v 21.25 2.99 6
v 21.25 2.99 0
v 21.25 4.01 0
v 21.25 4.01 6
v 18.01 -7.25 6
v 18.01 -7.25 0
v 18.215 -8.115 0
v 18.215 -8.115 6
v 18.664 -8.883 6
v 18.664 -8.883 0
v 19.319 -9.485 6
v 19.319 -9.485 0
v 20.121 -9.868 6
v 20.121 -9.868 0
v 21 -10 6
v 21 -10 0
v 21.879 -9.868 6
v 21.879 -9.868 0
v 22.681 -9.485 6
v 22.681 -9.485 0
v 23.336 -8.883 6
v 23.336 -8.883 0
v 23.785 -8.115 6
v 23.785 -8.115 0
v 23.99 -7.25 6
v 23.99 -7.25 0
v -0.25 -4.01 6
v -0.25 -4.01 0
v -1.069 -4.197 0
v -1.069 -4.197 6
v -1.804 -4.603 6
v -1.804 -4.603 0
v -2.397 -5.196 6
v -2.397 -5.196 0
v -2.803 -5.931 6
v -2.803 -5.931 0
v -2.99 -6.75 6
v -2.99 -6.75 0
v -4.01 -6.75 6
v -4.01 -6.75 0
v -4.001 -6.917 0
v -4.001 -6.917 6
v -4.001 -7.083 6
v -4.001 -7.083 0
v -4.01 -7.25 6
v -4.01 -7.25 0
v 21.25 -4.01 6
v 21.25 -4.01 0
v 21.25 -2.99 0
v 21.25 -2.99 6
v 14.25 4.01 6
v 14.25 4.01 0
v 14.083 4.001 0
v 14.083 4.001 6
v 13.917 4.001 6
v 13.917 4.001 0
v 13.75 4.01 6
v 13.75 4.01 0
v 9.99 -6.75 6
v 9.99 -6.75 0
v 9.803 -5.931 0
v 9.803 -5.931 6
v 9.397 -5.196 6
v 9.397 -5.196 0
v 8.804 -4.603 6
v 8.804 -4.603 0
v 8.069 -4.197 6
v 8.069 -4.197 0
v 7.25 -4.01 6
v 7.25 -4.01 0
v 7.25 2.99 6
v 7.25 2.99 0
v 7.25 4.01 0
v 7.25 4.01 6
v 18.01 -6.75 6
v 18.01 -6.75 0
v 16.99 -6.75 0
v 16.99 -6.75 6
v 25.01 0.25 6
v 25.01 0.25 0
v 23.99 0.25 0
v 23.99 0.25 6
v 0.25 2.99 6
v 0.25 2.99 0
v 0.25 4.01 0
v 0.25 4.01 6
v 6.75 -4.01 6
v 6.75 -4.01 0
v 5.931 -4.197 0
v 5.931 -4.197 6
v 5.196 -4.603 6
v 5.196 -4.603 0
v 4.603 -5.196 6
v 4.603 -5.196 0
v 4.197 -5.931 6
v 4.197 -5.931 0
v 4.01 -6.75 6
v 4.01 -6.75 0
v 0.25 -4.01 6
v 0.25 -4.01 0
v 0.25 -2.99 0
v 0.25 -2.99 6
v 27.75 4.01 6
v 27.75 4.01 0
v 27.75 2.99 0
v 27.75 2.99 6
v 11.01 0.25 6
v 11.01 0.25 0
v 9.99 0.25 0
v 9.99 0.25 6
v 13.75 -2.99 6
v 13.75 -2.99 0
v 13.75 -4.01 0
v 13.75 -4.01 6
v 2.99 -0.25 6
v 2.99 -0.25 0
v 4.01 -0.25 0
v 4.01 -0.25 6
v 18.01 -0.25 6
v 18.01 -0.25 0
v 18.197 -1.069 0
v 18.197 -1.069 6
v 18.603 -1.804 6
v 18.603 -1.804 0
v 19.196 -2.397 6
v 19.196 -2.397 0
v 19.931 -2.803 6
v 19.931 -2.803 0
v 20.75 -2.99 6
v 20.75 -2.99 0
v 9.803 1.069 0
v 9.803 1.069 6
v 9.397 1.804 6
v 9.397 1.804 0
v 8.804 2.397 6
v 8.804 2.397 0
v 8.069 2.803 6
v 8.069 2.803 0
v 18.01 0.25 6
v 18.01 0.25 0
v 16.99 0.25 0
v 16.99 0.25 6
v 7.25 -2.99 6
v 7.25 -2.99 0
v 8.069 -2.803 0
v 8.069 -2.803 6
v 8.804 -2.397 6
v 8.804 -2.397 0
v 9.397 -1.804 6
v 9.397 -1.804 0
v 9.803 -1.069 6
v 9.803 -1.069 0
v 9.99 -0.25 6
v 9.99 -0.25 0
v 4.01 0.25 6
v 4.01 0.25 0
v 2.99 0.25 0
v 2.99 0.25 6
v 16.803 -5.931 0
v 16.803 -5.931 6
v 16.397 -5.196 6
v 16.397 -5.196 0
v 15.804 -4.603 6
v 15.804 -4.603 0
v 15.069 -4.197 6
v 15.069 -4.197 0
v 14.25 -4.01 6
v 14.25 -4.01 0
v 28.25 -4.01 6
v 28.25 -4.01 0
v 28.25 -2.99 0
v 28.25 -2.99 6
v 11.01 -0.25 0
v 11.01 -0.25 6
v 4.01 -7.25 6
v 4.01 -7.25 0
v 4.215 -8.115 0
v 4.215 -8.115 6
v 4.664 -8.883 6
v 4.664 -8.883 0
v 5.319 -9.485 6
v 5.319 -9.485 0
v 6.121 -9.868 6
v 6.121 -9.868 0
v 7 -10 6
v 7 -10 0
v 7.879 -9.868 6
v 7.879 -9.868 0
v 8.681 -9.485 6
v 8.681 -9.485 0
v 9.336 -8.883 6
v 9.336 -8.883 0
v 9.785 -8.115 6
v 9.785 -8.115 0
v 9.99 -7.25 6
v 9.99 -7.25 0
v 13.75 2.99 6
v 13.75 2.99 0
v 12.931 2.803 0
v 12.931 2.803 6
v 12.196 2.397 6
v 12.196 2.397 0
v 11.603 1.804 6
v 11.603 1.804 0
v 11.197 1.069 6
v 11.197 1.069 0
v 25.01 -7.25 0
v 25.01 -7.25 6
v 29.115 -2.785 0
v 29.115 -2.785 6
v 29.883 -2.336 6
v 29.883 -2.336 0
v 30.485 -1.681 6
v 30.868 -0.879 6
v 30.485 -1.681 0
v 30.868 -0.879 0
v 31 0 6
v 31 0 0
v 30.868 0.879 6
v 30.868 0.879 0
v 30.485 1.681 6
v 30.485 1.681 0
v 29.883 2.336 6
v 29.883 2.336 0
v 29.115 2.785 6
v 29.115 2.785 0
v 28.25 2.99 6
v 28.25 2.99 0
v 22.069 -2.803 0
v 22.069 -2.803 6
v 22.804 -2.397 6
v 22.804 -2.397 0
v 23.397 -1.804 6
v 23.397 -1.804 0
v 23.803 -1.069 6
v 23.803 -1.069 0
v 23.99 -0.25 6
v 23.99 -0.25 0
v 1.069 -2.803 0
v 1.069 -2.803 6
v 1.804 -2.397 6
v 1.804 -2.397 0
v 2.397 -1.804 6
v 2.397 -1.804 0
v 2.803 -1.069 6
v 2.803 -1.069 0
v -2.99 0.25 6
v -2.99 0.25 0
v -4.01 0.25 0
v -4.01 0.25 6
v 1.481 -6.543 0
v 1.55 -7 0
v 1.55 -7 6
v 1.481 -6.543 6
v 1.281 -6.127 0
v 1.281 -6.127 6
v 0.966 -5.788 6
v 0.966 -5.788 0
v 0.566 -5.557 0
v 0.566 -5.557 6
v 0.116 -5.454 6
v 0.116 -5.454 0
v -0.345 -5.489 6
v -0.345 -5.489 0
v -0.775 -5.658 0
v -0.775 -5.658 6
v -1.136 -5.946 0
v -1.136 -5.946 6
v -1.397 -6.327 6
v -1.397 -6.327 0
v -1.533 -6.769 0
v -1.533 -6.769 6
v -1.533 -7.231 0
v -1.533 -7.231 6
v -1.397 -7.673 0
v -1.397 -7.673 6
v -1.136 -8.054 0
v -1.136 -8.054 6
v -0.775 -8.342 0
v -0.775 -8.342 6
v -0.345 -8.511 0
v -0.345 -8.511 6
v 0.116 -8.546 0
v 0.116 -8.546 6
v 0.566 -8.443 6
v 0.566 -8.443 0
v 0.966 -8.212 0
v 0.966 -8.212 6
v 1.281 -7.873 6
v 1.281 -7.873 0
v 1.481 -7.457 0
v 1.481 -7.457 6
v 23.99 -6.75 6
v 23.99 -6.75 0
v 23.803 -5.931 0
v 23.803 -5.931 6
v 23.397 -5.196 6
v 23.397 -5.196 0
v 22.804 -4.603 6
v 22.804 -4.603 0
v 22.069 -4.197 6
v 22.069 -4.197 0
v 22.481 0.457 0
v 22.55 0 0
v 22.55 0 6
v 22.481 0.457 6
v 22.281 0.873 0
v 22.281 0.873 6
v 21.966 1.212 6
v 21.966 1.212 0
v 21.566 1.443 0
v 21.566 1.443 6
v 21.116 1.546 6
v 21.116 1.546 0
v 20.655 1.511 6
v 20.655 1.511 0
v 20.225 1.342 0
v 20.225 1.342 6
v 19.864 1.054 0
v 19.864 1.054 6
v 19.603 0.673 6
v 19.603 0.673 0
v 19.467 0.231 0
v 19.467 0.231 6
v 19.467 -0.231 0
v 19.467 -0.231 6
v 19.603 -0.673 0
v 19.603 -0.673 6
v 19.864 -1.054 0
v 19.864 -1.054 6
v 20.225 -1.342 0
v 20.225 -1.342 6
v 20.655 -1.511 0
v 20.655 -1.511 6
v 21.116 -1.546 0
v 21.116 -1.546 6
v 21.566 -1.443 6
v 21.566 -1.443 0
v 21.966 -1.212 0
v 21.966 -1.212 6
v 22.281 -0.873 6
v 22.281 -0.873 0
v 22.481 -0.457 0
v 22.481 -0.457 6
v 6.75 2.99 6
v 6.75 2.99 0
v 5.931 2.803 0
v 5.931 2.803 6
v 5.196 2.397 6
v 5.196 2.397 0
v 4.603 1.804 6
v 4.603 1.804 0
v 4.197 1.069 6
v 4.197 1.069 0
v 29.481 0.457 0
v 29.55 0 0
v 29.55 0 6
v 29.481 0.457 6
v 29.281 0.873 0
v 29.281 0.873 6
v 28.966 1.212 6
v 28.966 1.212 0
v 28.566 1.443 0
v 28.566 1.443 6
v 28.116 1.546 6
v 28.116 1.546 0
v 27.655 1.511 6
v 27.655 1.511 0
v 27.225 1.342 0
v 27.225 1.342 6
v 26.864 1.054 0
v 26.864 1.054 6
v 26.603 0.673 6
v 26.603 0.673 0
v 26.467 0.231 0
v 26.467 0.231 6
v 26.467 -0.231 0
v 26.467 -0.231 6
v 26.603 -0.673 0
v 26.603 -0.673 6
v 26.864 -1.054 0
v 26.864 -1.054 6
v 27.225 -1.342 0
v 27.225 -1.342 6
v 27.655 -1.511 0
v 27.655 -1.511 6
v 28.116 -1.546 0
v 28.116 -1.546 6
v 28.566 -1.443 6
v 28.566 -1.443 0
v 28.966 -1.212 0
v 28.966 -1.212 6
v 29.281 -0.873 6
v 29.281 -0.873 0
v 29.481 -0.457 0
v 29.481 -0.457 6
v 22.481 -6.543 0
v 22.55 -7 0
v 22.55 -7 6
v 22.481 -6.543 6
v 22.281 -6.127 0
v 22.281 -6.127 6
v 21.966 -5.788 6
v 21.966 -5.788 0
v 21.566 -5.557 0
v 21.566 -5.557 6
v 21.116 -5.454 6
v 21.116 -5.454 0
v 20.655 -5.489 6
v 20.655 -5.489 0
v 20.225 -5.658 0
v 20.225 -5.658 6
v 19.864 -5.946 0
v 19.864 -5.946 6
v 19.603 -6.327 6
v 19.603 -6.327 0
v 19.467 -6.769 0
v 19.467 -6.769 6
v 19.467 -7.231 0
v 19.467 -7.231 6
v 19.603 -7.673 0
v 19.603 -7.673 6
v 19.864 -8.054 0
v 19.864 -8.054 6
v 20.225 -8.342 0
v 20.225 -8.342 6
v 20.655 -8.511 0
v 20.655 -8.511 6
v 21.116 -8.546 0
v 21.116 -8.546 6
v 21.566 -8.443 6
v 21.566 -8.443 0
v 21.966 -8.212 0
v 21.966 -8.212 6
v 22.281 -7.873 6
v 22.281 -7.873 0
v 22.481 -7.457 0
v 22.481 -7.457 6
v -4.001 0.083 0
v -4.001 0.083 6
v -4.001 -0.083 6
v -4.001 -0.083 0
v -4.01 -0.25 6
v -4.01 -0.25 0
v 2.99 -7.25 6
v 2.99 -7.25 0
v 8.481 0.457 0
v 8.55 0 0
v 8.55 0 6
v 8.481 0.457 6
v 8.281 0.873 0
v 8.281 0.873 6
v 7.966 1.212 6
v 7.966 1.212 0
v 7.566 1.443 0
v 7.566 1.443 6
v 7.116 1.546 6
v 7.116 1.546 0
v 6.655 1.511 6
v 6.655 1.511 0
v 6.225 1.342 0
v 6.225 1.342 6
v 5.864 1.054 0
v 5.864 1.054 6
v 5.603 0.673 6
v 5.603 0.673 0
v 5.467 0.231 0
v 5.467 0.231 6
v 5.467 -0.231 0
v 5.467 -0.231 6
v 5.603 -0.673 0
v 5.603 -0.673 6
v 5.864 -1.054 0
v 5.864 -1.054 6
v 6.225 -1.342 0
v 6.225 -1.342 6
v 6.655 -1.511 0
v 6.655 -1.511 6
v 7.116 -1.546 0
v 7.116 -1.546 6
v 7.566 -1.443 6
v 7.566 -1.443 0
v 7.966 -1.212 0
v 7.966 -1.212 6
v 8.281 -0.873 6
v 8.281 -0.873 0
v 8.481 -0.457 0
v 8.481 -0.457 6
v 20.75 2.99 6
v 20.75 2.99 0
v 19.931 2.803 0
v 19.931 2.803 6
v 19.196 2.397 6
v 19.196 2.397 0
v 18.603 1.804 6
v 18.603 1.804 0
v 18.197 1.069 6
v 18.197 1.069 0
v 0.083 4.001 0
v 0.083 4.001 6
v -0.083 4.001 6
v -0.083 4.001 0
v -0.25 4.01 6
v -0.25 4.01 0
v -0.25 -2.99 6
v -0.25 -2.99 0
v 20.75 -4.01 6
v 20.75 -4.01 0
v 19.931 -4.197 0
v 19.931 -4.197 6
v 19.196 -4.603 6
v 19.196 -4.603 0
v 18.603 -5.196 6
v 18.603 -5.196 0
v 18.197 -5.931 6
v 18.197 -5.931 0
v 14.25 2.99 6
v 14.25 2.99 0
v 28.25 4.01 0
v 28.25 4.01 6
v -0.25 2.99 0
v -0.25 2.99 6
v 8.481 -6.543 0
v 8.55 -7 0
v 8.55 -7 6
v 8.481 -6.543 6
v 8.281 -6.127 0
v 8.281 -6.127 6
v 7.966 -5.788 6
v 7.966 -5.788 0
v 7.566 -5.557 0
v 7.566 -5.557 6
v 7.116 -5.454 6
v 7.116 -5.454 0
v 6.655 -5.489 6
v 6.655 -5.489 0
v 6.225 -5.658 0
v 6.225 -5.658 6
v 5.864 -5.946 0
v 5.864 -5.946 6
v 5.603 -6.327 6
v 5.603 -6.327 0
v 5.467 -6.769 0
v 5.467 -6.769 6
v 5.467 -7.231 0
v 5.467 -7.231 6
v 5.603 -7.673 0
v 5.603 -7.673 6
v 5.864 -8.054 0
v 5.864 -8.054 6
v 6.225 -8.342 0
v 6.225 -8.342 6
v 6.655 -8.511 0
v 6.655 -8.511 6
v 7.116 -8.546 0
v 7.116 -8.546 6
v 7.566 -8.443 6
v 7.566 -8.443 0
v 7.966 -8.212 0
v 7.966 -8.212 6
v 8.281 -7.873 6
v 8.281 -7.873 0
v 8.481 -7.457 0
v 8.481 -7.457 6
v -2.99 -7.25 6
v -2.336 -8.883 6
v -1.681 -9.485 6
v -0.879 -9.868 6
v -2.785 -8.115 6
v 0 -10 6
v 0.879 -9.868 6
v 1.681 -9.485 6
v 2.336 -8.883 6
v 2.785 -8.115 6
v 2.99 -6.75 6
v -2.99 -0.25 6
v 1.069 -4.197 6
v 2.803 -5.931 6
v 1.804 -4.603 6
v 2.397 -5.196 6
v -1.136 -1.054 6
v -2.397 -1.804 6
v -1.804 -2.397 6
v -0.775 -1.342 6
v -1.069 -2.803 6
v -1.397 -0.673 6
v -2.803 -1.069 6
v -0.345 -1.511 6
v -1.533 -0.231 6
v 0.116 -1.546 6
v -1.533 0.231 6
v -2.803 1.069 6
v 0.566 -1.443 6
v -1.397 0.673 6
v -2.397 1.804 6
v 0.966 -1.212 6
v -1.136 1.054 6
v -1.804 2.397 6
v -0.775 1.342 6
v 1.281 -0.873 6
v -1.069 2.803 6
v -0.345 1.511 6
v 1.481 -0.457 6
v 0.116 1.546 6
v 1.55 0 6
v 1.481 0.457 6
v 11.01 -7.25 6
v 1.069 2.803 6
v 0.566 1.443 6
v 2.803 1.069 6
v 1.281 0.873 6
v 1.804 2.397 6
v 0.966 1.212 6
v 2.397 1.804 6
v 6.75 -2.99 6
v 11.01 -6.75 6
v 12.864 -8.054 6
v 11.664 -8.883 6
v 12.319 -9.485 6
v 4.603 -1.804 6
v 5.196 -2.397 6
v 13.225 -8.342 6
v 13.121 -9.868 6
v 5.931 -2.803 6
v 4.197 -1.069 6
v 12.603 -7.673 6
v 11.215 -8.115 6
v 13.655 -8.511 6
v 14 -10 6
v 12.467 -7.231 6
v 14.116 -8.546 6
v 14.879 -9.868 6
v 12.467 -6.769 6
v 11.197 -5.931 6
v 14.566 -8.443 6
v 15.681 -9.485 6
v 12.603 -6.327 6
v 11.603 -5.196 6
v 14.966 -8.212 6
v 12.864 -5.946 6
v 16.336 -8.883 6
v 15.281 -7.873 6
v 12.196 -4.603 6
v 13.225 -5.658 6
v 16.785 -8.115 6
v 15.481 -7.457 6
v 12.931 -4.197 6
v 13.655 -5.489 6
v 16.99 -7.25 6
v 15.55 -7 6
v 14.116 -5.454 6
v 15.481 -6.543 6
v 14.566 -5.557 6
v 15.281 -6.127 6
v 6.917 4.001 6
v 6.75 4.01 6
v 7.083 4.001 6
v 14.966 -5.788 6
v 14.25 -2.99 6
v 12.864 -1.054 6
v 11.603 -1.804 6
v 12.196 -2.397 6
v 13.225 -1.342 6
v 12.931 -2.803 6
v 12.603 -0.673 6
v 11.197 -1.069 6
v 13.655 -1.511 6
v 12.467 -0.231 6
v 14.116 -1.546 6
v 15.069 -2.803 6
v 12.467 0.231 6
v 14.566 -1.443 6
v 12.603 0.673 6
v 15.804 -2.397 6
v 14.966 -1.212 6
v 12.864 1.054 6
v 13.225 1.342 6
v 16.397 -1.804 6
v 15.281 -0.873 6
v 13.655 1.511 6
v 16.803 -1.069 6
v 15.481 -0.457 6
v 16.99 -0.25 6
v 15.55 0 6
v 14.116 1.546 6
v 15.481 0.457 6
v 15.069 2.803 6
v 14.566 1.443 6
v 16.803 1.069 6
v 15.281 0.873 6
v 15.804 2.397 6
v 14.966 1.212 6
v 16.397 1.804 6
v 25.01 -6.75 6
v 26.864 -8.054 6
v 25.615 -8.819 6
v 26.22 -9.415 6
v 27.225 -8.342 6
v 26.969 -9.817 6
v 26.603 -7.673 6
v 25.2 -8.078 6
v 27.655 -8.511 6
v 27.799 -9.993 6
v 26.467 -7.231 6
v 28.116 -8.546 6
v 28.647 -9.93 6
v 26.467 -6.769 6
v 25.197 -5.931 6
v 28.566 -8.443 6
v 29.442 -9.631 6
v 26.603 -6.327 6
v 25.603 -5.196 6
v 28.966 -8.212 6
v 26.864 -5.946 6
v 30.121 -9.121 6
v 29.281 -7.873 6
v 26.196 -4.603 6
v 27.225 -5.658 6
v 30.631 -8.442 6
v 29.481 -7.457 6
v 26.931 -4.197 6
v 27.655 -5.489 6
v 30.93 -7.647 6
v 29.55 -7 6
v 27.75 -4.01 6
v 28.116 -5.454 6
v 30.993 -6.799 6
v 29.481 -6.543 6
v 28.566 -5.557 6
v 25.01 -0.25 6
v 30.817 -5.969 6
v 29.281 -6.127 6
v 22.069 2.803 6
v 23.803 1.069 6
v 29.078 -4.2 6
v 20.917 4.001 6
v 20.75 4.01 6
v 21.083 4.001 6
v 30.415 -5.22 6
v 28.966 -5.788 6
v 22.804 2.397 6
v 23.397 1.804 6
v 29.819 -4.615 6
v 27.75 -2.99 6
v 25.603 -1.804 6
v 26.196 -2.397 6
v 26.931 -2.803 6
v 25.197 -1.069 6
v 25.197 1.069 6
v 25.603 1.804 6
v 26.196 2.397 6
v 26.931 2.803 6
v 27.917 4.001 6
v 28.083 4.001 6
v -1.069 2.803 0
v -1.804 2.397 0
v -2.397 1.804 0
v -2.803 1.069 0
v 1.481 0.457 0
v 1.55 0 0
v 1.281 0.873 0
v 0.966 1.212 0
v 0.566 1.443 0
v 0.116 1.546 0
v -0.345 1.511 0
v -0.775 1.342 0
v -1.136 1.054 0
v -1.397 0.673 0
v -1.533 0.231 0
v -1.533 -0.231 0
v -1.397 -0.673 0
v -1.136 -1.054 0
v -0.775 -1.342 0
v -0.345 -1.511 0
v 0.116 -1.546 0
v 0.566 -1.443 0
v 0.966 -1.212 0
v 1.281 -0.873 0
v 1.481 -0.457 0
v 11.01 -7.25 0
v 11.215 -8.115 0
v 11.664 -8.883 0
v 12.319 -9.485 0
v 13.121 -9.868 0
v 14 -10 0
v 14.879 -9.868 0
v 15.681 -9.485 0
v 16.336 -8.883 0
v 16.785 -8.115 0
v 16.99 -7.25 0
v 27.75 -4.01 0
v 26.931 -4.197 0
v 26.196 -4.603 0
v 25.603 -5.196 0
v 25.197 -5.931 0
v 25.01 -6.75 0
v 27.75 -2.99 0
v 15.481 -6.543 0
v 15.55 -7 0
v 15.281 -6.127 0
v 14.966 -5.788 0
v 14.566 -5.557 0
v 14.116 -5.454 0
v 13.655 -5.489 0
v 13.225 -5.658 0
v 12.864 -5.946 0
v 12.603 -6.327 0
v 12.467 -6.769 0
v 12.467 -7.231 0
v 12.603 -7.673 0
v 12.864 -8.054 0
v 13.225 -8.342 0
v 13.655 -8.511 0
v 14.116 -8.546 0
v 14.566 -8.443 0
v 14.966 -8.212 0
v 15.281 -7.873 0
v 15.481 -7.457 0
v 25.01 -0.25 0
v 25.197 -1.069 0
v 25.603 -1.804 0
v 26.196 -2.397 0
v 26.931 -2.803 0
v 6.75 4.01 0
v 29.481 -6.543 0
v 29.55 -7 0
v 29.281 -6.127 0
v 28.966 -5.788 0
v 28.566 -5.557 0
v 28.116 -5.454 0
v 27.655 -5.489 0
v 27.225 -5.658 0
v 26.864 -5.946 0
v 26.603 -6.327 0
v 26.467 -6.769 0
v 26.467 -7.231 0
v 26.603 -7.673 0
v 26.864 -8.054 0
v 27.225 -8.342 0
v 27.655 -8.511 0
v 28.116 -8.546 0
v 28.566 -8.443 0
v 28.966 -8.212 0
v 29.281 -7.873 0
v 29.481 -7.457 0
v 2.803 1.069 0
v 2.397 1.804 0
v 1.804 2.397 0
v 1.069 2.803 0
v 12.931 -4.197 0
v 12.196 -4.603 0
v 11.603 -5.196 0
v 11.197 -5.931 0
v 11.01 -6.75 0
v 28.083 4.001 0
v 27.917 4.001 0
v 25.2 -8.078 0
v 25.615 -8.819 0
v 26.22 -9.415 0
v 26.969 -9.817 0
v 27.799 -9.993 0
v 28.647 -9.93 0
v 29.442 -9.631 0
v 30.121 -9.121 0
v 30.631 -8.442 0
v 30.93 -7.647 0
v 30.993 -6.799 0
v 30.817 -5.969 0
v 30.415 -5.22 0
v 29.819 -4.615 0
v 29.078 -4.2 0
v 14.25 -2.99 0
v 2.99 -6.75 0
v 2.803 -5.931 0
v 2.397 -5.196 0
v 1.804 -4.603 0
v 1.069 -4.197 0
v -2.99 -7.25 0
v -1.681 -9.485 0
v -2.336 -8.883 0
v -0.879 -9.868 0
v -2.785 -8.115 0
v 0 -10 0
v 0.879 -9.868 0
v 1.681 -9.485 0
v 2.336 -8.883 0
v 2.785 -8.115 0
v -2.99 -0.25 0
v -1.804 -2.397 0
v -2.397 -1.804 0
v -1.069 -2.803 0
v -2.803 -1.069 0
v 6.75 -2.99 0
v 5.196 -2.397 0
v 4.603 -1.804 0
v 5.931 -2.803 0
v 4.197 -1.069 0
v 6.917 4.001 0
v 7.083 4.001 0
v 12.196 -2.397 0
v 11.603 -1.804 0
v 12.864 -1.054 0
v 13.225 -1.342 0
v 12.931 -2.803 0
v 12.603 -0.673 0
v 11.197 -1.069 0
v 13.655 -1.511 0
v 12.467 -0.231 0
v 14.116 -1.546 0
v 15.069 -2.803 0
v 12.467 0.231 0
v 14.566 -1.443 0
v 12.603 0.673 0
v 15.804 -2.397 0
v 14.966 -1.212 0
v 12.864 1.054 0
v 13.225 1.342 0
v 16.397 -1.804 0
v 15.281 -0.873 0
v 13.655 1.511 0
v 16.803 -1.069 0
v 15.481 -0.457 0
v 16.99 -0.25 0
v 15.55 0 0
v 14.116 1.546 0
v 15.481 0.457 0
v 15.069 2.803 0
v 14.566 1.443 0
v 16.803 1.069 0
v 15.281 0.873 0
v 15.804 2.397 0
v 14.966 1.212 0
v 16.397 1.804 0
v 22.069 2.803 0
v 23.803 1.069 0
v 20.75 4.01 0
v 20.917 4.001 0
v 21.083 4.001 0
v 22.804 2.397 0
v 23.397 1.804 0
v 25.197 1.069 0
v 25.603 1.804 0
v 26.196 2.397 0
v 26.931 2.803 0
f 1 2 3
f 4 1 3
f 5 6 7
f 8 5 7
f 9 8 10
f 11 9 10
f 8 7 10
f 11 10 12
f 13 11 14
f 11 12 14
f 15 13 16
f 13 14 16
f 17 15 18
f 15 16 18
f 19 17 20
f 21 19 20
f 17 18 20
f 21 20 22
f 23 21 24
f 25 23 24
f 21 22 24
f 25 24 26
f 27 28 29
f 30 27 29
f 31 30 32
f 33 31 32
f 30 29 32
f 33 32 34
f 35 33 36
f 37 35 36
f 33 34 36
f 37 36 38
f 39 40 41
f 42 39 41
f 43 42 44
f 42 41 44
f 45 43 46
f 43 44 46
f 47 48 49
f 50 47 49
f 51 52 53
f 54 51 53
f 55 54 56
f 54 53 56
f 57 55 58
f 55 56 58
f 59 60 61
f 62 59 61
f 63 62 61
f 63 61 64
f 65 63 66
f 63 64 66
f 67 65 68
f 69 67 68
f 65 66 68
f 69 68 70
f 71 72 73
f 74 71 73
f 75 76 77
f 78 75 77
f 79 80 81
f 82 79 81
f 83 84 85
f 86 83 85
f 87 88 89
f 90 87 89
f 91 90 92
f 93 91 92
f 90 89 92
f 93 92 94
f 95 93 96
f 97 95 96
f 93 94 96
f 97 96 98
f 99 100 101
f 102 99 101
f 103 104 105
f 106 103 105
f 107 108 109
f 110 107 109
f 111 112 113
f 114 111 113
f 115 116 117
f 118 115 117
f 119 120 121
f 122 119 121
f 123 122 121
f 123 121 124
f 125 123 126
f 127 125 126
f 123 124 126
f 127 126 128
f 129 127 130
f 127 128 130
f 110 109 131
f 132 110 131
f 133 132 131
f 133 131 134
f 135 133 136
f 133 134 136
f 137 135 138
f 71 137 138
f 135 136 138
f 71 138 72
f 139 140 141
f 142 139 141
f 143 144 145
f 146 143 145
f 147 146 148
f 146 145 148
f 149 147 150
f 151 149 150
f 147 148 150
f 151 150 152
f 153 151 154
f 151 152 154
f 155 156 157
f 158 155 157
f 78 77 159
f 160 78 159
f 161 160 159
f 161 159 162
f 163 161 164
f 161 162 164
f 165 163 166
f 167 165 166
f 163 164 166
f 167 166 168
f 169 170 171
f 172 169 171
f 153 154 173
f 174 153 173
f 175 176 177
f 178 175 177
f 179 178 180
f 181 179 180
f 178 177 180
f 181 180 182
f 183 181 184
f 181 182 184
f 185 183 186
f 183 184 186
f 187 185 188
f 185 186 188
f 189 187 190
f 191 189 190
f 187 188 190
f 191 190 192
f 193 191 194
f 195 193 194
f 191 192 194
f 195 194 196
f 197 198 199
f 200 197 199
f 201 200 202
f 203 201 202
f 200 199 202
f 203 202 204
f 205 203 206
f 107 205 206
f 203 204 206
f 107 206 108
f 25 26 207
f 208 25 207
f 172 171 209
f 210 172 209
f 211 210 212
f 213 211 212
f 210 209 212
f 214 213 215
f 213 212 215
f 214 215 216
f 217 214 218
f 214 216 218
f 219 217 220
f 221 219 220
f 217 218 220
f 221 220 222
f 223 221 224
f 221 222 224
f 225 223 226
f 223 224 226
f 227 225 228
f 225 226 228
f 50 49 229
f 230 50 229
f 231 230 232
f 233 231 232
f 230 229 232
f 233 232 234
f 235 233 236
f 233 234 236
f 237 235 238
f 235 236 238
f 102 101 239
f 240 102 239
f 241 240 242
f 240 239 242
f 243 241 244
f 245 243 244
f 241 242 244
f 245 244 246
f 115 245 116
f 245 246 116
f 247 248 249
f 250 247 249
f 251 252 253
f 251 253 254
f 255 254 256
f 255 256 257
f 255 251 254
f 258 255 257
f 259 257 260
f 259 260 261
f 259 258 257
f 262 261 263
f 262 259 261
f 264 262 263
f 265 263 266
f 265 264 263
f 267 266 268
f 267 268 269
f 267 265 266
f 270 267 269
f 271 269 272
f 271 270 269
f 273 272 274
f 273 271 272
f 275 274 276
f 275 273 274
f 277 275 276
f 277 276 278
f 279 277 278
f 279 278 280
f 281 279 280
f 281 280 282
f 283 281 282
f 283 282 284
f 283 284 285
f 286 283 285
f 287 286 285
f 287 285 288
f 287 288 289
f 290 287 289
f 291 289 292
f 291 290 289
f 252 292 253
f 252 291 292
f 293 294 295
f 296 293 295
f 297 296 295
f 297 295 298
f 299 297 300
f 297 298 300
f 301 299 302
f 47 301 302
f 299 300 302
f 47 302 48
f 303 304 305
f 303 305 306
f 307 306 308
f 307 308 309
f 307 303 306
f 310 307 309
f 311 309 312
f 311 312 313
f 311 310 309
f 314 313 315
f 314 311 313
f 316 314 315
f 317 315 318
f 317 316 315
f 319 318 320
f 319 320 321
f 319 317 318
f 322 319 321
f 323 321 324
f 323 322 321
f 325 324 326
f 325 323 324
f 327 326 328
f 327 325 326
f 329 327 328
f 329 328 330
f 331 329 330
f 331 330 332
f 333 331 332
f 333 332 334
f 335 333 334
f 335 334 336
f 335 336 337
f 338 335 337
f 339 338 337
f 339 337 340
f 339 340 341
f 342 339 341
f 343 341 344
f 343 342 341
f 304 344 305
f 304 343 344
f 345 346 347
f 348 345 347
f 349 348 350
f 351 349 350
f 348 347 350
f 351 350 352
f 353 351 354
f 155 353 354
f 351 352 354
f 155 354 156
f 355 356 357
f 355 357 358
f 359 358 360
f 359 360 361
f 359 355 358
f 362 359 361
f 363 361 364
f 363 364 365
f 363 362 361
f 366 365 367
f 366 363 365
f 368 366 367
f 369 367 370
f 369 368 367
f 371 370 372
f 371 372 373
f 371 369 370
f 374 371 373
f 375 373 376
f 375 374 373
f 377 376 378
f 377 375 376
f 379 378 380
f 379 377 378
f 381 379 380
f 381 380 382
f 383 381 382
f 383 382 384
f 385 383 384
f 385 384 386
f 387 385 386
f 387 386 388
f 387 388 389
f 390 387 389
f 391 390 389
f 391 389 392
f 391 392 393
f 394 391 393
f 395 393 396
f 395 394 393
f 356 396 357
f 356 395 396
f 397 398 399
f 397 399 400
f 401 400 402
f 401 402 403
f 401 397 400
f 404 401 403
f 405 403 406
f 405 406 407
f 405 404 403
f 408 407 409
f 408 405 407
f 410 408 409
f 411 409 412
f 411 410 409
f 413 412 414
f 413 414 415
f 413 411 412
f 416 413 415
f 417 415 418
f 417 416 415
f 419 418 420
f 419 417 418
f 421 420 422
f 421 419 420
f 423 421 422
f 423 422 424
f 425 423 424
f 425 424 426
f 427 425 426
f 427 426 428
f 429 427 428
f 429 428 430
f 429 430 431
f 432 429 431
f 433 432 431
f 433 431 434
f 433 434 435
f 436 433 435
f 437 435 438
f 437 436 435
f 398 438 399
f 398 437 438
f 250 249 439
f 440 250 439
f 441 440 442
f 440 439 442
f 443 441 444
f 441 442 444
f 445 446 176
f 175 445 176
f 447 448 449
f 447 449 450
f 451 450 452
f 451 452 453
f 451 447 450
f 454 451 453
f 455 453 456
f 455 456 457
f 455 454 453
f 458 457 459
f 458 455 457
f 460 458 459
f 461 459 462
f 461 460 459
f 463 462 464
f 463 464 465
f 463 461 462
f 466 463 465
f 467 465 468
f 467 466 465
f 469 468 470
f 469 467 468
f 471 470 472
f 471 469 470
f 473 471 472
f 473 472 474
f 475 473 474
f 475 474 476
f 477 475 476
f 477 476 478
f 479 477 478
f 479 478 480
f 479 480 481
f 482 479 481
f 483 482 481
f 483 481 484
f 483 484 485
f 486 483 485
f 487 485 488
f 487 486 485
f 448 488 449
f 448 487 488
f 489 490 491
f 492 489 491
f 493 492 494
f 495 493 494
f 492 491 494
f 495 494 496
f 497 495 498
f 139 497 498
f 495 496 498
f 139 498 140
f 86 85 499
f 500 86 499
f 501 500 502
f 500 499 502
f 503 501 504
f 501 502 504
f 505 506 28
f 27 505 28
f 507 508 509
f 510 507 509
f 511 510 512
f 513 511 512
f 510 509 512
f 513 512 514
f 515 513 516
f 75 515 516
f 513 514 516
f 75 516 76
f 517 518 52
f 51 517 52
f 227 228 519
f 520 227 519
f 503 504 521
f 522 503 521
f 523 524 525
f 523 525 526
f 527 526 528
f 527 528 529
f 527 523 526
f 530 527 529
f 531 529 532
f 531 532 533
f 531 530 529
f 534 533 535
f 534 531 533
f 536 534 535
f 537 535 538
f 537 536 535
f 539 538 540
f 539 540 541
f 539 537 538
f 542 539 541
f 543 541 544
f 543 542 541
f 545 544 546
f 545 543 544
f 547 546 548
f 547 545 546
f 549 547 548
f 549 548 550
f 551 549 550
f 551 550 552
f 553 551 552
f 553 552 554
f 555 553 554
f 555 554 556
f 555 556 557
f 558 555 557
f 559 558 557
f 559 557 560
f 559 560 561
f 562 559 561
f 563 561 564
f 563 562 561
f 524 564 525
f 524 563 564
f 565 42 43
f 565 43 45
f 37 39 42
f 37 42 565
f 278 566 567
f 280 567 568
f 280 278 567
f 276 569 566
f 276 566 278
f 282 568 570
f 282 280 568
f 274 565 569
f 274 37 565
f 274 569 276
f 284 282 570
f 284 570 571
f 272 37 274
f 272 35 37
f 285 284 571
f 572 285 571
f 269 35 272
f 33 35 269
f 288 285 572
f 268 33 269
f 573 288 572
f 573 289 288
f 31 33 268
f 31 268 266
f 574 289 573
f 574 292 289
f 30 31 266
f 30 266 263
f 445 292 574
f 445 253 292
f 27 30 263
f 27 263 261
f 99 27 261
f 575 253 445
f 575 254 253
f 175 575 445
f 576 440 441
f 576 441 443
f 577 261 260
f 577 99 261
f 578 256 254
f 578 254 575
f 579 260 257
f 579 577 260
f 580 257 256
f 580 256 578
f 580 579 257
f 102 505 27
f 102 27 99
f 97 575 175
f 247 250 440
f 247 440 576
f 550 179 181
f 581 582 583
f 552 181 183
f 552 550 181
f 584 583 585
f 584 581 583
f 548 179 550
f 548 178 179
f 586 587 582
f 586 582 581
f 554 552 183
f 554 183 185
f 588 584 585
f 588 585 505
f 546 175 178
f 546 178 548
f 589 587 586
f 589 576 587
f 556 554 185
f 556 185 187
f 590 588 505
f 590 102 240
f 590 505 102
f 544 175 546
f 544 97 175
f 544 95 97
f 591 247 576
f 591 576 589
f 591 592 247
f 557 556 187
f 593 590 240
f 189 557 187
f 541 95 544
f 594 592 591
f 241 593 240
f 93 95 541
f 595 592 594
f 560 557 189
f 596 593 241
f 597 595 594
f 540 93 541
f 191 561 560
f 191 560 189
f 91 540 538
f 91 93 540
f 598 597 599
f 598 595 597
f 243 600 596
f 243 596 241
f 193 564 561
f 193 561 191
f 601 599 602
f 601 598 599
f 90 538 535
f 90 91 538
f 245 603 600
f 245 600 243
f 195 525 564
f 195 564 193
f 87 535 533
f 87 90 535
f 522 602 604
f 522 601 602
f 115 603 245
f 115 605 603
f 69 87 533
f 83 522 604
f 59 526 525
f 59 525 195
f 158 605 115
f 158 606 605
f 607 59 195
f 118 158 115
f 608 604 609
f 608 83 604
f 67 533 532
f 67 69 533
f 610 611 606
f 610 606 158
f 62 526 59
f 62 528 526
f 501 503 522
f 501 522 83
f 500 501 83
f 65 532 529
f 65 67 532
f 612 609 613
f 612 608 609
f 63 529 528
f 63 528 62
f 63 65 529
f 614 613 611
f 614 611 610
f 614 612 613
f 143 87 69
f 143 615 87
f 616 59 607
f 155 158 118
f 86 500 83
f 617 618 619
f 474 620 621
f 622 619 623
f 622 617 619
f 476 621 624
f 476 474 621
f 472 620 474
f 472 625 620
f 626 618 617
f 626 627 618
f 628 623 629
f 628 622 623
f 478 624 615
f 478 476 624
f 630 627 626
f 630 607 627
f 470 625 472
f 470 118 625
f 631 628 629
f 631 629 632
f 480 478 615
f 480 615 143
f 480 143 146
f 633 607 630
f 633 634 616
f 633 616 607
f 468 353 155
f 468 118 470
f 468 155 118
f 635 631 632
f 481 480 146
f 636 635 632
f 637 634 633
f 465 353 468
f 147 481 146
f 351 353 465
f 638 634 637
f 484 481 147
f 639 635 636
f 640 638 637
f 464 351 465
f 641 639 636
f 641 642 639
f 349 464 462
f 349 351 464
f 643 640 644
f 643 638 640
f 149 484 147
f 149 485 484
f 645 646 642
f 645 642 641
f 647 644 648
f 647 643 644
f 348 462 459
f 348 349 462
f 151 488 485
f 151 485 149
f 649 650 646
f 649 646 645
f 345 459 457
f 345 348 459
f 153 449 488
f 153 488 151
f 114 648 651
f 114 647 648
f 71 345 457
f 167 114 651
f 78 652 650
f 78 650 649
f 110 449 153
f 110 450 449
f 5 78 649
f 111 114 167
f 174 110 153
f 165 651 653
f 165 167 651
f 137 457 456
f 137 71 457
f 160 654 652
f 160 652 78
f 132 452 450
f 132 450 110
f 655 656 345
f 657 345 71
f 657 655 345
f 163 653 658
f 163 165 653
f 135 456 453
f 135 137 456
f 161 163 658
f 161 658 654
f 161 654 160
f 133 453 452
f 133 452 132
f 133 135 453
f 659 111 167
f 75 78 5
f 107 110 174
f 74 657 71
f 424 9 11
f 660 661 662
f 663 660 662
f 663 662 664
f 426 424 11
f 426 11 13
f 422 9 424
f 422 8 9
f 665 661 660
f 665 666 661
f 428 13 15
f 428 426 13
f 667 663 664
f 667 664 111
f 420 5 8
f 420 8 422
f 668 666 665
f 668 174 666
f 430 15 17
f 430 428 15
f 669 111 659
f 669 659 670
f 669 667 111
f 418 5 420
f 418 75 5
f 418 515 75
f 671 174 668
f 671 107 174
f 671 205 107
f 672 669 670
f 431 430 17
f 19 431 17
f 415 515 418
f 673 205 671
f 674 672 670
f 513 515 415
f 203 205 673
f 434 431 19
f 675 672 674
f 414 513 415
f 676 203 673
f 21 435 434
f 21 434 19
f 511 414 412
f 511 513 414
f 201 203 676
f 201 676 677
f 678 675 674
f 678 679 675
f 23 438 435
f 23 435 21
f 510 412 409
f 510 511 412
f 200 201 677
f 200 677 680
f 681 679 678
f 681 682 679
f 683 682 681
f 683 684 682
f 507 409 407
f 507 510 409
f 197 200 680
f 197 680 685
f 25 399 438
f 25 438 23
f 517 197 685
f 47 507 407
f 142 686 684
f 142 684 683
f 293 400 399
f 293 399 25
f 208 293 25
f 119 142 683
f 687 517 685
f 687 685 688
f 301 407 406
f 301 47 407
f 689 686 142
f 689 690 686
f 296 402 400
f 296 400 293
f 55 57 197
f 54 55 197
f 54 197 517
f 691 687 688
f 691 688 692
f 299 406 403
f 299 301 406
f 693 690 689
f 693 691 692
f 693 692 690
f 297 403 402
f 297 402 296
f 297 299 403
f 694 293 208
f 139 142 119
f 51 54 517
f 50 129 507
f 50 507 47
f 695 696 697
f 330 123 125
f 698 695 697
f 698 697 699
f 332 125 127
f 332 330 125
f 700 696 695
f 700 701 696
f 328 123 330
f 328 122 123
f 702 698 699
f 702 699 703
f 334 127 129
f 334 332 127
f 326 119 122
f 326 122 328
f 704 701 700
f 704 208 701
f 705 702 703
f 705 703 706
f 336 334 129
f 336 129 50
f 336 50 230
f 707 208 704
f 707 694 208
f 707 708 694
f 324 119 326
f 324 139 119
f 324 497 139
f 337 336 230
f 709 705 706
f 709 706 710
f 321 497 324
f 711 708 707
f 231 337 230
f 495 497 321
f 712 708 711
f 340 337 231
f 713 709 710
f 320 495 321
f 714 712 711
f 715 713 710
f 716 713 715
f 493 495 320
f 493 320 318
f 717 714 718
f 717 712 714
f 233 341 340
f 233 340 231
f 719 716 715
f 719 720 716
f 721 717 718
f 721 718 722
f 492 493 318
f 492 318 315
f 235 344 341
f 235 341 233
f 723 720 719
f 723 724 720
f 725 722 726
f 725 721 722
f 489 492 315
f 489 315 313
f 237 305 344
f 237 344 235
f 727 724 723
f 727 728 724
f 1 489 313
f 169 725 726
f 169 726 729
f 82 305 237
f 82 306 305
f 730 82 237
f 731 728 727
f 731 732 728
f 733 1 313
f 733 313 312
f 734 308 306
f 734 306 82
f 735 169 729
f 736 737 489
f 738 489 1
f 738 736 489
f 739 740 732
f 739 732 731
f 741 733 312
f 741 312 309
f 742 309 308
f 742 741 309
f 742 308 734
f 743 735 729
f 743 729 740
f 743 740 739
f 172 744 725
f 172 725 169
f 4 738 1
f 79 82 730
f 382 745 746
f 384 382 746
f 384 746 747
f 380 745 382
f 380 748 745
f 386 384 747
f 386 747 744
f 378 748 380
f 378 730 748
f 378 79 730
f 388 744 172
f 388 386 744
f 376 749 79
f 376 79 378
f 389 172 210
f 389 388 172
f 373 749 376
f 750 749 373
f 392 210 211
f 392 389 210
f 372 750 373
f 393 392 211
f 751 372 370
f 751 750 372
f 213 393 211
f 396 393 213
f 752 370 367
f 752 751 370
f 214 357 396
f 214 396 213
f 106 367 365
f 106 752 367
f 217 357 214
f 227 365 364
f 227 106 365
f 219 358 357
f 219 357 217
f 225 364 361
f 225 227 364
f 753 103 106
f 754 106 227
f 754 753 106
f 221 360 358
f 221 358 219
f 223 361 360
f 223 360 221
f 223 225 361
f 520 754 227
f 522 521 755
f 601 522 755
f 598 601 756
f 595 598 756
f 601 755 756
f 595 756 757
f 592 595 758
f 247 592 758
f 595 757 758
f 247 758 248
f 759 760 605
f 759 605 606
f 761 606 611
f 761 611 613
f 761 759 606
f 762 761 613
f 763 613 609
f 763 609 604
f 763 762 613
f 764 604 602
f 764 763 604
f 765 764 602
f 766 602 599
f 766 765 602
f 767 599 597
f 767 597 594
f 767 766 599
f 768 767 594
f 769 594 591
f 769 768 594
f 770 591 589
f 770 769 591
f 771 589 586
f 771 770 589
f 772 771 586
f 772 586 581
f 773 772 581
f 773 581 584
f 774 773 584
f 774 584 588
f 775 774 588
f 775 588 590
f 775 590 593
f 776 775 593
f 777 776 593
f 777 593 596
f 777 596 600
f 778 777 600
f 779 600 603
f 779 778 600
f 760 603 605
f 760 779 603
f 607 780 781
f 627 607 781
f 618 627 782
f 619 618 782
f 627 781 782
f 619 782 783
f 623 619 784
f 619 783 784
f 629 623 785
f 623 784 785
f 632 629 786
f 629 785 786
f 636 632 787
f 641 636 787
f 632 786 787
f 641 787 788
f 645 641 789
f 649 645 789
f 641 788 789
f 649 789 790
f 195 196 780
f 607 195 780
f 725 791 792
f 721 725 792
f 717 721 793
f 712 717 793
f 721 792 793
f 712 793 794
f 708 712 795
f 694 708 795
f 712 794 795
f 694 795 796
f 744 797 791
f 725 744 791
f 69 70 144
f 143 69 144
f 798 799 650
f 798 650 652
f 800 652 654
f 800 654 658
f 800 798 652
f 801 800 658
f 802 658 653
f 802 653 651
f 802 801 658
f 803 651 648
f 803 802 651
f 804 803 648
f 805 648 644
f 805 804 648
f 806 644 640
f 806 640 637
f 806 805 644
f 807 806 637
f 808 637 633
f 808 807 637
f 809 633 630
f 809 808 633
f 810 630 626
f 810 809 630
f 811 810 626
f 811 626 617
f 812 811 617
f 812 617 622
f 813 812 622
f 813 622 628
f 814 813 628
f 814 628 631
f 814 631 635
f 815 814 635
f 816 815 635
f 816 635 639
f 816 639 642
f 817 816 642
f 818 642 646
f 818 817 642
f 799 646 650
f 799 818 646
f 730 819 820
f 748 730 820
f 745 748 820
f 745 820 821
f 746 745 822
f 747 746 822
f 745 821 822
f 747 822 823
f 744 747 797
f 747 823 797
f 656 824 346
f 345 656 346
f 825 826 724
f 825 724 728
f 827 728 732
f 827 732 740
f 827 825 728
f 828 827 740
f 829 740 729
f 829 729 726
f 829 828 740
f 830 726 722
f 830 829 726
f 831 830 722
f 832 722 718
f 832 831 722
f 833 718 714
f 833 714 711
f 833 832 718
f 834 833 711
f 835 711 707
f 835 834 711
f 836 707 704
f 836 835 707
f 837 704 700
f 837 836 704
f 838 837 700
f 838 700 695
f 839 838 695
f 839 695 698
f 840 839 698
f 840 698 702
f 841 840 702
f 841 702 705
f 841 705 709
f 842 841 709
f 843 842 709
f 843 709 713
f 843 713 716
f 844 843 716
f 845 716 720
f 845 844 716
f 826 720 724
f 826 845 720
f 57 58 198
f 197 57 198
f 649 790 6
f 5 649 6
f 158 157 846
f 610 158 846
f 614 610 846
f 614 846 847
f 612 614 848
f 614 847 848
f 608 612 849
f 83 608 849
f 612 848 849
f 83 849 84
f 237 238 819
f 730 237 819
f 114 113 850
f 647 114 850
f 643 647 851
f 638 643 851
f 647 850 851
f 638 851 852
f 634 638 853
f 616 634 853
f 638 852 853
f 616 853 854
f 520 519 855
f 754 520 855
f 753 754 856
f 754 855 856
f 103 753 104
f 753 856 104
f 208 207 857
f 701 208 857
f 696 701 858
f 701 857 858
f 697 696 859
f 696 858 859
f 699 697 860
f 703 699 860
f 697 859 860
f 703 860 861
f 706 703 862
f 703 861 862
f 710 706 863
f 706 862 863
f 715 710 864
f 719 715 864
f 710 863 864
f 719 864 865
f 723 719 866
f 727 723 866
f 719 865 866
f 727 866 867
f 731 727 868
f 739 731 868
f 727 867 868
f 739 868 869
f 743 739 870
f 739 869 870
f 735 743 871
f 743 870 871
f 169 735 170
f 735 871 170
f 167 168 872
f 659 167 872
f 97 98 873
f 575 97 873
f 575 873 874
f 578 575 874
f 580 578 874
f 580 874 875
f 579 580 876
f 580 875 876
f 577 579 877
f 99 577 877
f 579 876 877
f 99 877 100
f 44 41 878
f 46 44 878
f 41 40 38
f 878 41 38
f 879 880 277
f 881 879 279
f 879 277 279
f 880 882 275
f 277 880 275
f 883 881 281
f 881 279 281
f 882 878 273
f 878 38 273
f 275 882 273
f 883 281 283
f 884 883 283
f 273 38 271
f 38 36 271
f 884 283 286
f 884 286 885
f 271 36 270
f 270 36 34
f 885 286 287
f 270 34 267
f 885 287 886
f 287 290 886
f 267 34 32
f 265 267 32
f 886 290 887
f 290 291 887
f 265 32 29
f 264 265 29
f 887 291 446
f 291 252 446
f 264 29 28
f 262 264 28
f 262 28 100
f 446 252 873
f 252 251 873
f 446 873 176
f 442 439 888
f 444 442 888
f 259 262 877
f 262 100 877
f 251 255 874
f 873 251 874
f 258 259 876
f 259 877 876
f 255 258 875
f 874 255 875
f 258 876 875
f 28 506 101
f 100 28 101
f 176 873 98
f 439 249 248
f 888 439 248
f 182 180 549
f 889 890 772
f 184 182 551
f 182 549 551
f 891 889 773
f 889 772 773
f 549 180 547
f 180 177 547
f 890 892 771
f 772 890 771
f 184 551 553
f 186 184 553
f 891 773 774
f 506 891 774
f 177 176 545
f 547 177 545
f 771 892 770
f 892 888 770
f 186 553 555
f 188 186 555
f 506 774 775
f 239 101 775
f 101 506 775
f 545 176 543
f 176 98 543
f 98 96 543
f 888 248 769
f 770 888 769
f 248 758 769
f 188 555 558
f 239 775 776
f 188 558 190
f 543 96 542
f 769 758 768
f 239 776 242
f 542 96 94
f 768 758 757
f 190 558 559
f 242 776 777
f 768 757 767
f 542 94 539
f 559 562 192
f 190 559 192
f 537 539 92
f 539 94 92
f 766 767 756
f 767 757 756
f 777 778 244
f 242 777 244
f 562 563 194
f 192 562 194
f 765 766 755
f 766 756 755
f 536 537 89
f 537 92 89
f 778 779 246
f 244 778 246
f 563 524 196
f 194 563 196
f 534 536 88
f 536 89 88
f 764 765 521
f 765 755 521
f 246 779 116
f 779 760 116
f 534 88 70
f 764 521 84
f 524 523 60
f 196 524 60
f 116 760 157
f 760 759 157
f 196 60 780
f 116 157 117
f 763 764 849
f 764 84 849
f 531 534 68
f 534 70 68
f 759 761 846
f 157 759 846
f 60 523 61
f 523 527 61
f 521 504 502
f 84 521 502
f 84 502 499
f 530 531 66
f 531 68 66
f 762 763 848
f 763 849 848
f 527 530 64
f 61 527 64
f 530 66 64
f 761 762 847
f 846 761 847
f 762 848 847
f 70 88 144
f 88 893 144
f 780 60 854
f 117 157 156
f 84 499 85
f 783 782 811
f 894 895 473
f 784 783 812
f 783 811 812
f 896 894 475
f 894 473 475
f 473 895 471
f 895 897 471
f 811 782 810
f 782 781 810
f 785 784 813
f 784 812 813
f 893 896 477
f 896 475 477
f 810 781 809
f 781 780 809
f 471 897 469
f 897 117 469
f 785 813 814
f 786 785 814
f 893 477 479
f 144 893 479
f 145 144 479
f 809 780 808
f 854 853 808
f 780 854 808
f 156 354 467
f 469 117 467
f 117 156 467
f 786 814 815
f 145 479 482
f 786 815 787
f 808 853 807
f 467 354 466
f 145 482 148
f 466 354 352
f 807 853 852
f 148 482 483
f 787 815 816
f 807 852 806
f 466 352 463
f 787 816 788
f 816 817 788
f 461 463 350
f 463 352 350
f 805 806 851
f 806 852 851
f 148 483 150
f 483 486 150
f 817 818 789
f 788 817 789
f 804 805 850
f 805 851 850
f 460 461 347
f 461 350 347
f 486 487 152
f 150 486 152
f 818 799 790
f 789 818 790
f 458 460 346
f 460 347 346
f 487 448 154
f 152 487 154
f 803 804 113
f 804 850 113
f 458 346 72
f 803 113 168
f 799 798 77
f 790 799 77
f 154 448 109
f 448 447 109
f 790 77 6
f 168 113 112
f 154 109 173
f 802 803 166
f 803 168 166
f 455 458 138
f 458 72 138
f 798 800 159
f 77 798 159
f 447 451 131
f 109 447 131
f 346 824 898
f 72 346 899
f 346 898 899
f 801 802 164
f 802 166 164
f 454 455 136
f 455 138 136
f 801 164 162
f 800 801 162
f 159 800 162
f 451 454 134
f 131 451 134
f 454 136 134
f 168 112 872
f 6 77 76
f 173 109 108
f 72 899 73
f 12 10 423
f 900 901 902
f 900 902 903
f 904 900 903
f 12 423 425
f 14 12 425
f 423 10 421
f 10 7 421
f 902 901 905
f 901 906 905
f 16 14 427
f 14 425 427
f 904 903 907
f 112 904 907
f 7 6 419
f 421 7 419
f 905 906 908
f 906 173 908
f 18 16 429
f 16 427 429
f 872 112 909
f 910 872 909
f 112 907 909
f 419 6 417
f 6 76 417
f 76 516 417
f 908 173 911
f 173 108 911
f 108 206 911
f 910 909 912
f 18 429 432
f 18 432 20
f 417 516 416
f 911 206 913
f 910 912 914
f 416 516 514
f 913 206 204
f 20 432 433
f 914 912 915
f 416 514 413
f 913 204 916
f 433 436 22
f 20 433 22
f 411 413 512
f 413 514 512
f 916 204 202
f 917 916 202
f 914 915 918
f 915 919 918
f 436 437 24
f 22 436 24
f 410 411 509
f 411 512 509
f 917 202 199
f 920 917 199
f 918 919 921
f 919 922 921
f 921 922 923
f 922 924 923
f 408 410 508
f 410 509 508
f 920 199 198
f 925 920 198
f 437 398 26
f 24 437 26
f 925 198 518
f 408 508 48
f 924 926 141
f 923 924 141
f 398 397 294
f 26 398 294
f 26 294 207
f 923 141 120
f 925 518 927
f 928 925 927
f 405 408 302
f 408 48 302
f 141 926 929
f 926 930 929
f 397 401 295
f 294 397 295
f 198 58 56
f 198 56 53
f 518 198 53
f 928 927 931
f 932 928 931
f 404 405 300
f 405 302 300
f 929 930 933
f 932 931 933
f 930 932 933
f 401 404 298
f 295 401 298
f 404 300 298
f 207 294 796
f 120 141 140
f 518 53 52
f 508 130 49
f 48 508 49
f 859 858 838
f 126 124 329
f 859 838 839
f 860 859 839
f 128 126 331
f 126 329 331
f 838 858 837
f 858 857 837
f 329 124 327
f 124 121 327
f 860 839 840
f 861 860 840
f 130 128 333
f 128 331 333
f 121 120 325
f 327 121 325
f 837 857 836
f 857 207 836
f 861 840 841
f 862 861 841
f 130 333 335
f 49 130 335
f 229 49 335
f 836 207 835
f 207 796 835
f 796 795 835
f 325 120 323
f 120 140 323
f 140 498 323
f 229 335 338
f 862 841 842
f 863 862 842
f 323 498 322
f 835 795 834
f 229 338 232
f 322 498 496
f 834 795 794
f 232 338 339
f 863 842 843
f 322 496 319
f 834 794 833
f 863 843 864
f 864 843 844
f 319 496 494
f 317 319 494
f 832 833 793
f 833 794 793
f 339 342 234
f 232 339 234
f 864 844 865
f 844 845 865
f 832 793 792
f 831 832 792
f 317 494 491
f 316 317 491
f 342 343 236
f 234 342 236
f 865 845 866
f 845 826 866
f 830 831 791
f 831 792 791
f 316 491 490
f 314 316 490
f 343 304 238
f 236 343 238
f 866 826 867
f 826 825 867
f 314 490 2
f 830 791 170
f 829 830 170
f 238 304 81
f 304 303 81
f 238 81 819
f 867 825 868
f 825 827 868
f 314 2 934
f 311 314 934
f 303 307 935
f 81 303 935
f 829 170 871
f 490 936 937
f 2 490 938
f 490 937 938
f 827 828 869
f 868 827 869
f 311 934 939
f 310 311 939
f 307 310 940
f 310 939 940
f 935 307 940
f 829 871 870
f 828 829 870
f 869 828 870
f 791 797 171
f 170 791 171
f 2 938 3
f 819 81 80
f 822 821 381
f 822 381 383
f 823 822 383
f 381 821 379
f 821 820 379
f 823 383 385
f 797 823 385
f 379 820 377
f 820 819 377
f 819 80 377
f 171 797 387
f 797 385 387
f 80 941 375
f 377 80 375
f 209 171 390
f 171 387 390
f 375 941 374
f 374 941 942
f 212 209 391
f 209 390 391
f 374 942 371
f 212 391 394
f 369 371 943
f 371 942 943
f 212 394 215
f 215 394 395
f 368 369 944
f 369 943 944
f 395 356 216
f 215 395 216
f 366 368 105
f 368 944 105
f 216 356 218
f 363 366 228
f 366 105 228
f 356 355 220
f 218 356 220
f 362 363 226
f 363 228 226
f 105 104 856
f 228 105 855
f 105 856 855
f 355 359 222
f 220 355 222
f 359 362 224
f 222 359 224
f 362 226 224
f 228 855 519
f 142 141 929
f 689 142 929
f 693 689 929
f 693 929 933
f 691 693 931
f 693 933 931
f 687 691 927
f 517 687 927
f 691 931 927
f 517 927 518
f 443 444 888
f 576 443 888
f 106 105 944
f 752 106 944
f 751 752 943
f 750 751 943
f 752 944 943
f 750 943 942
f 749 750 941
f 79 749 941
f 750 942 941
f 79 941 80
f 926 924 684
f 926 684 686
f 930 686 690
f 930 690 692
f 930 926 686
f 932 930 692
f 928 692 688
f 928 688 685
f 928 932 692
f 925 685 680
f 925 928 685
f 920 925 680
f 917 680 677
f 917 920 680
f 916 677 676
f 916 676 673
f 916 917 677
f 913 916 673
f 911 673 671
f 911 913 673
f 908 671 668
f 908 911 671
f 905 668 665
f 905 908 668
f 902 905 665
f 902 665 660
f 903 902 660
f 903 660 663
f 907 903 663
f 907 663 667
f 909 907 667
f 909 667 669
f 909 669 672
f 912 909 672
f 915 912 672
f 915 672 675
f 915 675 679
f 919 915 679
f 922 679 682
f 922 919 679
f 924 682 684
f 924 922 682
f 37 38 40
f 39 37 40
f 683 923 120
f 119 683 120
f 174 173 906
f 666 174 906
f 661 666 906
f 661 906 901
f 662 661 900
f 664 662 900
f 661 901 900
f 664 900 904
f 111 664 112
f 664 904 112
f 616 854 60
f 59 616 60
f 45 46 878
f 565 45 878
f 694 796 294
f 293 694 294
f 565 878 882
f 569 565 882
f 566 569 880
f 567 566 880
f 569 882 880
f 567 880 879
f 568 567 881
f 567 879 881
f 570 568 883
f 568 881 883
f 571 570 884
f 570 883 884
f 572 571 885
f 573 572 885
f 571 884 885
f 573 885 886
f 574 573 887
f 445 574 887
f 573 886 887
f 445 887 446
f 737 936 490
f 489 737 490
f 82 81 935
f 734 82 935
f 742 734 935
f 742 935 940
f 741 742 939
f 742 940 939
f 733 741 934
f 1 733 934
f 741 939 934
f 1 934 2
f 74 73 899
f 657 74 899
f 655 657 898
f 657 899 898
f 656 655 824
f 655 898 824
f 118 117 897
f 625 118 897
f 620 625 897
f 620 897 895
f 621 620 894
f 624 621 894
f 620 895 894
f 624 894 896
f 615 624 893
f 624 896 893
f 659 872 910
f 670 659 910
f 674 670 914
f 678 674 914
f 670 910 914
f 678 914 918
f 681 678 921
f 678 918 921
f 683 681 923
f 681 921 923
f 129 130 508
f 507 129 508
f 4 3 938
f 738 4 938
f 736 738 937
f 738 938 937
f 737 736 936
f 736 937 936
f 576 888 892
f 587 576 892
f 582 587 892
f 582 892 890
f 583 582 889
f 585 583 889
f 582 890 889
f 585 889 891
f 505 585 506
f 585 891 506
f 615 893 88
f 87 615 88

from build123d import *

# Parameters (mm, degrees)
ESQUISSE1_R                     = 1.55
BOSS_EXTRU_2_DEPTH              = 6
R_P_TITION_LIN_AIRE1_COUNT      = 2
R_P_TITION_LIN_AIRE1_PITCH      = 7
R_P_TITION_LIN_AIRE1_COUNT_DIR2 = 5
R_P_TITION_LIN_AIRE1_PITCH_DIR2 = 7


with BuildPart() as part:
    # Esquisse1 → Boss.-Extru.2 (new body)
    with BuildSketch(Plane.XY):
        with BuildLine():
            Line((-0.25, 4.010434814), (-0.25, 2.989565186))
            ThreePointArc((-0.25, 2.989565186), (-2.121320344, 2.121320344), (-2.989565186, 0.25))
            Line((-2.989565186, 0.25), (-4.010434814, 0.25))
            ThreePointArc((-4.010434814, 0.25), (-4, 0), (-4.010434814, -0.25))
            Line((-4.010434814, -0.25), (-2.989565186, -0.25))
            ThreePointArc((-2.989565186, -0.25), (2.121320344, -2.121320344), (0.25, 2.989565186))
            Line((0.25, 2.989565186), (0.25, 4.010434814))
            ThreePointArc((0.25, 4.010434814), (0, 4), (-0.25, 4.010434814))
        make_face()
        Circle(ESQUISSE1_R, mode=Mode.SUBTRACT)
    boss_extru_2 = extrude(amount=BOSS_EXTRU_2_DEPTH)

    # Répétition linéaire1: Boss.-Extru.2 2 × 5
    with Locations(*[(j * R_P_TITION_LIN_AIRE1_PITCH_DIR2, -i * R_P_TITION_LIN_AIRE1_PITCH, 0) for i in range(R_P_TITION_LIN_AIRE1_COUNT) for j in range(R_P_TITION_LIN_AIRE1_COUNT_DIR2) if (i, j) != (0, 0)]):
        add(boss_extru_2)


solid = part.part
